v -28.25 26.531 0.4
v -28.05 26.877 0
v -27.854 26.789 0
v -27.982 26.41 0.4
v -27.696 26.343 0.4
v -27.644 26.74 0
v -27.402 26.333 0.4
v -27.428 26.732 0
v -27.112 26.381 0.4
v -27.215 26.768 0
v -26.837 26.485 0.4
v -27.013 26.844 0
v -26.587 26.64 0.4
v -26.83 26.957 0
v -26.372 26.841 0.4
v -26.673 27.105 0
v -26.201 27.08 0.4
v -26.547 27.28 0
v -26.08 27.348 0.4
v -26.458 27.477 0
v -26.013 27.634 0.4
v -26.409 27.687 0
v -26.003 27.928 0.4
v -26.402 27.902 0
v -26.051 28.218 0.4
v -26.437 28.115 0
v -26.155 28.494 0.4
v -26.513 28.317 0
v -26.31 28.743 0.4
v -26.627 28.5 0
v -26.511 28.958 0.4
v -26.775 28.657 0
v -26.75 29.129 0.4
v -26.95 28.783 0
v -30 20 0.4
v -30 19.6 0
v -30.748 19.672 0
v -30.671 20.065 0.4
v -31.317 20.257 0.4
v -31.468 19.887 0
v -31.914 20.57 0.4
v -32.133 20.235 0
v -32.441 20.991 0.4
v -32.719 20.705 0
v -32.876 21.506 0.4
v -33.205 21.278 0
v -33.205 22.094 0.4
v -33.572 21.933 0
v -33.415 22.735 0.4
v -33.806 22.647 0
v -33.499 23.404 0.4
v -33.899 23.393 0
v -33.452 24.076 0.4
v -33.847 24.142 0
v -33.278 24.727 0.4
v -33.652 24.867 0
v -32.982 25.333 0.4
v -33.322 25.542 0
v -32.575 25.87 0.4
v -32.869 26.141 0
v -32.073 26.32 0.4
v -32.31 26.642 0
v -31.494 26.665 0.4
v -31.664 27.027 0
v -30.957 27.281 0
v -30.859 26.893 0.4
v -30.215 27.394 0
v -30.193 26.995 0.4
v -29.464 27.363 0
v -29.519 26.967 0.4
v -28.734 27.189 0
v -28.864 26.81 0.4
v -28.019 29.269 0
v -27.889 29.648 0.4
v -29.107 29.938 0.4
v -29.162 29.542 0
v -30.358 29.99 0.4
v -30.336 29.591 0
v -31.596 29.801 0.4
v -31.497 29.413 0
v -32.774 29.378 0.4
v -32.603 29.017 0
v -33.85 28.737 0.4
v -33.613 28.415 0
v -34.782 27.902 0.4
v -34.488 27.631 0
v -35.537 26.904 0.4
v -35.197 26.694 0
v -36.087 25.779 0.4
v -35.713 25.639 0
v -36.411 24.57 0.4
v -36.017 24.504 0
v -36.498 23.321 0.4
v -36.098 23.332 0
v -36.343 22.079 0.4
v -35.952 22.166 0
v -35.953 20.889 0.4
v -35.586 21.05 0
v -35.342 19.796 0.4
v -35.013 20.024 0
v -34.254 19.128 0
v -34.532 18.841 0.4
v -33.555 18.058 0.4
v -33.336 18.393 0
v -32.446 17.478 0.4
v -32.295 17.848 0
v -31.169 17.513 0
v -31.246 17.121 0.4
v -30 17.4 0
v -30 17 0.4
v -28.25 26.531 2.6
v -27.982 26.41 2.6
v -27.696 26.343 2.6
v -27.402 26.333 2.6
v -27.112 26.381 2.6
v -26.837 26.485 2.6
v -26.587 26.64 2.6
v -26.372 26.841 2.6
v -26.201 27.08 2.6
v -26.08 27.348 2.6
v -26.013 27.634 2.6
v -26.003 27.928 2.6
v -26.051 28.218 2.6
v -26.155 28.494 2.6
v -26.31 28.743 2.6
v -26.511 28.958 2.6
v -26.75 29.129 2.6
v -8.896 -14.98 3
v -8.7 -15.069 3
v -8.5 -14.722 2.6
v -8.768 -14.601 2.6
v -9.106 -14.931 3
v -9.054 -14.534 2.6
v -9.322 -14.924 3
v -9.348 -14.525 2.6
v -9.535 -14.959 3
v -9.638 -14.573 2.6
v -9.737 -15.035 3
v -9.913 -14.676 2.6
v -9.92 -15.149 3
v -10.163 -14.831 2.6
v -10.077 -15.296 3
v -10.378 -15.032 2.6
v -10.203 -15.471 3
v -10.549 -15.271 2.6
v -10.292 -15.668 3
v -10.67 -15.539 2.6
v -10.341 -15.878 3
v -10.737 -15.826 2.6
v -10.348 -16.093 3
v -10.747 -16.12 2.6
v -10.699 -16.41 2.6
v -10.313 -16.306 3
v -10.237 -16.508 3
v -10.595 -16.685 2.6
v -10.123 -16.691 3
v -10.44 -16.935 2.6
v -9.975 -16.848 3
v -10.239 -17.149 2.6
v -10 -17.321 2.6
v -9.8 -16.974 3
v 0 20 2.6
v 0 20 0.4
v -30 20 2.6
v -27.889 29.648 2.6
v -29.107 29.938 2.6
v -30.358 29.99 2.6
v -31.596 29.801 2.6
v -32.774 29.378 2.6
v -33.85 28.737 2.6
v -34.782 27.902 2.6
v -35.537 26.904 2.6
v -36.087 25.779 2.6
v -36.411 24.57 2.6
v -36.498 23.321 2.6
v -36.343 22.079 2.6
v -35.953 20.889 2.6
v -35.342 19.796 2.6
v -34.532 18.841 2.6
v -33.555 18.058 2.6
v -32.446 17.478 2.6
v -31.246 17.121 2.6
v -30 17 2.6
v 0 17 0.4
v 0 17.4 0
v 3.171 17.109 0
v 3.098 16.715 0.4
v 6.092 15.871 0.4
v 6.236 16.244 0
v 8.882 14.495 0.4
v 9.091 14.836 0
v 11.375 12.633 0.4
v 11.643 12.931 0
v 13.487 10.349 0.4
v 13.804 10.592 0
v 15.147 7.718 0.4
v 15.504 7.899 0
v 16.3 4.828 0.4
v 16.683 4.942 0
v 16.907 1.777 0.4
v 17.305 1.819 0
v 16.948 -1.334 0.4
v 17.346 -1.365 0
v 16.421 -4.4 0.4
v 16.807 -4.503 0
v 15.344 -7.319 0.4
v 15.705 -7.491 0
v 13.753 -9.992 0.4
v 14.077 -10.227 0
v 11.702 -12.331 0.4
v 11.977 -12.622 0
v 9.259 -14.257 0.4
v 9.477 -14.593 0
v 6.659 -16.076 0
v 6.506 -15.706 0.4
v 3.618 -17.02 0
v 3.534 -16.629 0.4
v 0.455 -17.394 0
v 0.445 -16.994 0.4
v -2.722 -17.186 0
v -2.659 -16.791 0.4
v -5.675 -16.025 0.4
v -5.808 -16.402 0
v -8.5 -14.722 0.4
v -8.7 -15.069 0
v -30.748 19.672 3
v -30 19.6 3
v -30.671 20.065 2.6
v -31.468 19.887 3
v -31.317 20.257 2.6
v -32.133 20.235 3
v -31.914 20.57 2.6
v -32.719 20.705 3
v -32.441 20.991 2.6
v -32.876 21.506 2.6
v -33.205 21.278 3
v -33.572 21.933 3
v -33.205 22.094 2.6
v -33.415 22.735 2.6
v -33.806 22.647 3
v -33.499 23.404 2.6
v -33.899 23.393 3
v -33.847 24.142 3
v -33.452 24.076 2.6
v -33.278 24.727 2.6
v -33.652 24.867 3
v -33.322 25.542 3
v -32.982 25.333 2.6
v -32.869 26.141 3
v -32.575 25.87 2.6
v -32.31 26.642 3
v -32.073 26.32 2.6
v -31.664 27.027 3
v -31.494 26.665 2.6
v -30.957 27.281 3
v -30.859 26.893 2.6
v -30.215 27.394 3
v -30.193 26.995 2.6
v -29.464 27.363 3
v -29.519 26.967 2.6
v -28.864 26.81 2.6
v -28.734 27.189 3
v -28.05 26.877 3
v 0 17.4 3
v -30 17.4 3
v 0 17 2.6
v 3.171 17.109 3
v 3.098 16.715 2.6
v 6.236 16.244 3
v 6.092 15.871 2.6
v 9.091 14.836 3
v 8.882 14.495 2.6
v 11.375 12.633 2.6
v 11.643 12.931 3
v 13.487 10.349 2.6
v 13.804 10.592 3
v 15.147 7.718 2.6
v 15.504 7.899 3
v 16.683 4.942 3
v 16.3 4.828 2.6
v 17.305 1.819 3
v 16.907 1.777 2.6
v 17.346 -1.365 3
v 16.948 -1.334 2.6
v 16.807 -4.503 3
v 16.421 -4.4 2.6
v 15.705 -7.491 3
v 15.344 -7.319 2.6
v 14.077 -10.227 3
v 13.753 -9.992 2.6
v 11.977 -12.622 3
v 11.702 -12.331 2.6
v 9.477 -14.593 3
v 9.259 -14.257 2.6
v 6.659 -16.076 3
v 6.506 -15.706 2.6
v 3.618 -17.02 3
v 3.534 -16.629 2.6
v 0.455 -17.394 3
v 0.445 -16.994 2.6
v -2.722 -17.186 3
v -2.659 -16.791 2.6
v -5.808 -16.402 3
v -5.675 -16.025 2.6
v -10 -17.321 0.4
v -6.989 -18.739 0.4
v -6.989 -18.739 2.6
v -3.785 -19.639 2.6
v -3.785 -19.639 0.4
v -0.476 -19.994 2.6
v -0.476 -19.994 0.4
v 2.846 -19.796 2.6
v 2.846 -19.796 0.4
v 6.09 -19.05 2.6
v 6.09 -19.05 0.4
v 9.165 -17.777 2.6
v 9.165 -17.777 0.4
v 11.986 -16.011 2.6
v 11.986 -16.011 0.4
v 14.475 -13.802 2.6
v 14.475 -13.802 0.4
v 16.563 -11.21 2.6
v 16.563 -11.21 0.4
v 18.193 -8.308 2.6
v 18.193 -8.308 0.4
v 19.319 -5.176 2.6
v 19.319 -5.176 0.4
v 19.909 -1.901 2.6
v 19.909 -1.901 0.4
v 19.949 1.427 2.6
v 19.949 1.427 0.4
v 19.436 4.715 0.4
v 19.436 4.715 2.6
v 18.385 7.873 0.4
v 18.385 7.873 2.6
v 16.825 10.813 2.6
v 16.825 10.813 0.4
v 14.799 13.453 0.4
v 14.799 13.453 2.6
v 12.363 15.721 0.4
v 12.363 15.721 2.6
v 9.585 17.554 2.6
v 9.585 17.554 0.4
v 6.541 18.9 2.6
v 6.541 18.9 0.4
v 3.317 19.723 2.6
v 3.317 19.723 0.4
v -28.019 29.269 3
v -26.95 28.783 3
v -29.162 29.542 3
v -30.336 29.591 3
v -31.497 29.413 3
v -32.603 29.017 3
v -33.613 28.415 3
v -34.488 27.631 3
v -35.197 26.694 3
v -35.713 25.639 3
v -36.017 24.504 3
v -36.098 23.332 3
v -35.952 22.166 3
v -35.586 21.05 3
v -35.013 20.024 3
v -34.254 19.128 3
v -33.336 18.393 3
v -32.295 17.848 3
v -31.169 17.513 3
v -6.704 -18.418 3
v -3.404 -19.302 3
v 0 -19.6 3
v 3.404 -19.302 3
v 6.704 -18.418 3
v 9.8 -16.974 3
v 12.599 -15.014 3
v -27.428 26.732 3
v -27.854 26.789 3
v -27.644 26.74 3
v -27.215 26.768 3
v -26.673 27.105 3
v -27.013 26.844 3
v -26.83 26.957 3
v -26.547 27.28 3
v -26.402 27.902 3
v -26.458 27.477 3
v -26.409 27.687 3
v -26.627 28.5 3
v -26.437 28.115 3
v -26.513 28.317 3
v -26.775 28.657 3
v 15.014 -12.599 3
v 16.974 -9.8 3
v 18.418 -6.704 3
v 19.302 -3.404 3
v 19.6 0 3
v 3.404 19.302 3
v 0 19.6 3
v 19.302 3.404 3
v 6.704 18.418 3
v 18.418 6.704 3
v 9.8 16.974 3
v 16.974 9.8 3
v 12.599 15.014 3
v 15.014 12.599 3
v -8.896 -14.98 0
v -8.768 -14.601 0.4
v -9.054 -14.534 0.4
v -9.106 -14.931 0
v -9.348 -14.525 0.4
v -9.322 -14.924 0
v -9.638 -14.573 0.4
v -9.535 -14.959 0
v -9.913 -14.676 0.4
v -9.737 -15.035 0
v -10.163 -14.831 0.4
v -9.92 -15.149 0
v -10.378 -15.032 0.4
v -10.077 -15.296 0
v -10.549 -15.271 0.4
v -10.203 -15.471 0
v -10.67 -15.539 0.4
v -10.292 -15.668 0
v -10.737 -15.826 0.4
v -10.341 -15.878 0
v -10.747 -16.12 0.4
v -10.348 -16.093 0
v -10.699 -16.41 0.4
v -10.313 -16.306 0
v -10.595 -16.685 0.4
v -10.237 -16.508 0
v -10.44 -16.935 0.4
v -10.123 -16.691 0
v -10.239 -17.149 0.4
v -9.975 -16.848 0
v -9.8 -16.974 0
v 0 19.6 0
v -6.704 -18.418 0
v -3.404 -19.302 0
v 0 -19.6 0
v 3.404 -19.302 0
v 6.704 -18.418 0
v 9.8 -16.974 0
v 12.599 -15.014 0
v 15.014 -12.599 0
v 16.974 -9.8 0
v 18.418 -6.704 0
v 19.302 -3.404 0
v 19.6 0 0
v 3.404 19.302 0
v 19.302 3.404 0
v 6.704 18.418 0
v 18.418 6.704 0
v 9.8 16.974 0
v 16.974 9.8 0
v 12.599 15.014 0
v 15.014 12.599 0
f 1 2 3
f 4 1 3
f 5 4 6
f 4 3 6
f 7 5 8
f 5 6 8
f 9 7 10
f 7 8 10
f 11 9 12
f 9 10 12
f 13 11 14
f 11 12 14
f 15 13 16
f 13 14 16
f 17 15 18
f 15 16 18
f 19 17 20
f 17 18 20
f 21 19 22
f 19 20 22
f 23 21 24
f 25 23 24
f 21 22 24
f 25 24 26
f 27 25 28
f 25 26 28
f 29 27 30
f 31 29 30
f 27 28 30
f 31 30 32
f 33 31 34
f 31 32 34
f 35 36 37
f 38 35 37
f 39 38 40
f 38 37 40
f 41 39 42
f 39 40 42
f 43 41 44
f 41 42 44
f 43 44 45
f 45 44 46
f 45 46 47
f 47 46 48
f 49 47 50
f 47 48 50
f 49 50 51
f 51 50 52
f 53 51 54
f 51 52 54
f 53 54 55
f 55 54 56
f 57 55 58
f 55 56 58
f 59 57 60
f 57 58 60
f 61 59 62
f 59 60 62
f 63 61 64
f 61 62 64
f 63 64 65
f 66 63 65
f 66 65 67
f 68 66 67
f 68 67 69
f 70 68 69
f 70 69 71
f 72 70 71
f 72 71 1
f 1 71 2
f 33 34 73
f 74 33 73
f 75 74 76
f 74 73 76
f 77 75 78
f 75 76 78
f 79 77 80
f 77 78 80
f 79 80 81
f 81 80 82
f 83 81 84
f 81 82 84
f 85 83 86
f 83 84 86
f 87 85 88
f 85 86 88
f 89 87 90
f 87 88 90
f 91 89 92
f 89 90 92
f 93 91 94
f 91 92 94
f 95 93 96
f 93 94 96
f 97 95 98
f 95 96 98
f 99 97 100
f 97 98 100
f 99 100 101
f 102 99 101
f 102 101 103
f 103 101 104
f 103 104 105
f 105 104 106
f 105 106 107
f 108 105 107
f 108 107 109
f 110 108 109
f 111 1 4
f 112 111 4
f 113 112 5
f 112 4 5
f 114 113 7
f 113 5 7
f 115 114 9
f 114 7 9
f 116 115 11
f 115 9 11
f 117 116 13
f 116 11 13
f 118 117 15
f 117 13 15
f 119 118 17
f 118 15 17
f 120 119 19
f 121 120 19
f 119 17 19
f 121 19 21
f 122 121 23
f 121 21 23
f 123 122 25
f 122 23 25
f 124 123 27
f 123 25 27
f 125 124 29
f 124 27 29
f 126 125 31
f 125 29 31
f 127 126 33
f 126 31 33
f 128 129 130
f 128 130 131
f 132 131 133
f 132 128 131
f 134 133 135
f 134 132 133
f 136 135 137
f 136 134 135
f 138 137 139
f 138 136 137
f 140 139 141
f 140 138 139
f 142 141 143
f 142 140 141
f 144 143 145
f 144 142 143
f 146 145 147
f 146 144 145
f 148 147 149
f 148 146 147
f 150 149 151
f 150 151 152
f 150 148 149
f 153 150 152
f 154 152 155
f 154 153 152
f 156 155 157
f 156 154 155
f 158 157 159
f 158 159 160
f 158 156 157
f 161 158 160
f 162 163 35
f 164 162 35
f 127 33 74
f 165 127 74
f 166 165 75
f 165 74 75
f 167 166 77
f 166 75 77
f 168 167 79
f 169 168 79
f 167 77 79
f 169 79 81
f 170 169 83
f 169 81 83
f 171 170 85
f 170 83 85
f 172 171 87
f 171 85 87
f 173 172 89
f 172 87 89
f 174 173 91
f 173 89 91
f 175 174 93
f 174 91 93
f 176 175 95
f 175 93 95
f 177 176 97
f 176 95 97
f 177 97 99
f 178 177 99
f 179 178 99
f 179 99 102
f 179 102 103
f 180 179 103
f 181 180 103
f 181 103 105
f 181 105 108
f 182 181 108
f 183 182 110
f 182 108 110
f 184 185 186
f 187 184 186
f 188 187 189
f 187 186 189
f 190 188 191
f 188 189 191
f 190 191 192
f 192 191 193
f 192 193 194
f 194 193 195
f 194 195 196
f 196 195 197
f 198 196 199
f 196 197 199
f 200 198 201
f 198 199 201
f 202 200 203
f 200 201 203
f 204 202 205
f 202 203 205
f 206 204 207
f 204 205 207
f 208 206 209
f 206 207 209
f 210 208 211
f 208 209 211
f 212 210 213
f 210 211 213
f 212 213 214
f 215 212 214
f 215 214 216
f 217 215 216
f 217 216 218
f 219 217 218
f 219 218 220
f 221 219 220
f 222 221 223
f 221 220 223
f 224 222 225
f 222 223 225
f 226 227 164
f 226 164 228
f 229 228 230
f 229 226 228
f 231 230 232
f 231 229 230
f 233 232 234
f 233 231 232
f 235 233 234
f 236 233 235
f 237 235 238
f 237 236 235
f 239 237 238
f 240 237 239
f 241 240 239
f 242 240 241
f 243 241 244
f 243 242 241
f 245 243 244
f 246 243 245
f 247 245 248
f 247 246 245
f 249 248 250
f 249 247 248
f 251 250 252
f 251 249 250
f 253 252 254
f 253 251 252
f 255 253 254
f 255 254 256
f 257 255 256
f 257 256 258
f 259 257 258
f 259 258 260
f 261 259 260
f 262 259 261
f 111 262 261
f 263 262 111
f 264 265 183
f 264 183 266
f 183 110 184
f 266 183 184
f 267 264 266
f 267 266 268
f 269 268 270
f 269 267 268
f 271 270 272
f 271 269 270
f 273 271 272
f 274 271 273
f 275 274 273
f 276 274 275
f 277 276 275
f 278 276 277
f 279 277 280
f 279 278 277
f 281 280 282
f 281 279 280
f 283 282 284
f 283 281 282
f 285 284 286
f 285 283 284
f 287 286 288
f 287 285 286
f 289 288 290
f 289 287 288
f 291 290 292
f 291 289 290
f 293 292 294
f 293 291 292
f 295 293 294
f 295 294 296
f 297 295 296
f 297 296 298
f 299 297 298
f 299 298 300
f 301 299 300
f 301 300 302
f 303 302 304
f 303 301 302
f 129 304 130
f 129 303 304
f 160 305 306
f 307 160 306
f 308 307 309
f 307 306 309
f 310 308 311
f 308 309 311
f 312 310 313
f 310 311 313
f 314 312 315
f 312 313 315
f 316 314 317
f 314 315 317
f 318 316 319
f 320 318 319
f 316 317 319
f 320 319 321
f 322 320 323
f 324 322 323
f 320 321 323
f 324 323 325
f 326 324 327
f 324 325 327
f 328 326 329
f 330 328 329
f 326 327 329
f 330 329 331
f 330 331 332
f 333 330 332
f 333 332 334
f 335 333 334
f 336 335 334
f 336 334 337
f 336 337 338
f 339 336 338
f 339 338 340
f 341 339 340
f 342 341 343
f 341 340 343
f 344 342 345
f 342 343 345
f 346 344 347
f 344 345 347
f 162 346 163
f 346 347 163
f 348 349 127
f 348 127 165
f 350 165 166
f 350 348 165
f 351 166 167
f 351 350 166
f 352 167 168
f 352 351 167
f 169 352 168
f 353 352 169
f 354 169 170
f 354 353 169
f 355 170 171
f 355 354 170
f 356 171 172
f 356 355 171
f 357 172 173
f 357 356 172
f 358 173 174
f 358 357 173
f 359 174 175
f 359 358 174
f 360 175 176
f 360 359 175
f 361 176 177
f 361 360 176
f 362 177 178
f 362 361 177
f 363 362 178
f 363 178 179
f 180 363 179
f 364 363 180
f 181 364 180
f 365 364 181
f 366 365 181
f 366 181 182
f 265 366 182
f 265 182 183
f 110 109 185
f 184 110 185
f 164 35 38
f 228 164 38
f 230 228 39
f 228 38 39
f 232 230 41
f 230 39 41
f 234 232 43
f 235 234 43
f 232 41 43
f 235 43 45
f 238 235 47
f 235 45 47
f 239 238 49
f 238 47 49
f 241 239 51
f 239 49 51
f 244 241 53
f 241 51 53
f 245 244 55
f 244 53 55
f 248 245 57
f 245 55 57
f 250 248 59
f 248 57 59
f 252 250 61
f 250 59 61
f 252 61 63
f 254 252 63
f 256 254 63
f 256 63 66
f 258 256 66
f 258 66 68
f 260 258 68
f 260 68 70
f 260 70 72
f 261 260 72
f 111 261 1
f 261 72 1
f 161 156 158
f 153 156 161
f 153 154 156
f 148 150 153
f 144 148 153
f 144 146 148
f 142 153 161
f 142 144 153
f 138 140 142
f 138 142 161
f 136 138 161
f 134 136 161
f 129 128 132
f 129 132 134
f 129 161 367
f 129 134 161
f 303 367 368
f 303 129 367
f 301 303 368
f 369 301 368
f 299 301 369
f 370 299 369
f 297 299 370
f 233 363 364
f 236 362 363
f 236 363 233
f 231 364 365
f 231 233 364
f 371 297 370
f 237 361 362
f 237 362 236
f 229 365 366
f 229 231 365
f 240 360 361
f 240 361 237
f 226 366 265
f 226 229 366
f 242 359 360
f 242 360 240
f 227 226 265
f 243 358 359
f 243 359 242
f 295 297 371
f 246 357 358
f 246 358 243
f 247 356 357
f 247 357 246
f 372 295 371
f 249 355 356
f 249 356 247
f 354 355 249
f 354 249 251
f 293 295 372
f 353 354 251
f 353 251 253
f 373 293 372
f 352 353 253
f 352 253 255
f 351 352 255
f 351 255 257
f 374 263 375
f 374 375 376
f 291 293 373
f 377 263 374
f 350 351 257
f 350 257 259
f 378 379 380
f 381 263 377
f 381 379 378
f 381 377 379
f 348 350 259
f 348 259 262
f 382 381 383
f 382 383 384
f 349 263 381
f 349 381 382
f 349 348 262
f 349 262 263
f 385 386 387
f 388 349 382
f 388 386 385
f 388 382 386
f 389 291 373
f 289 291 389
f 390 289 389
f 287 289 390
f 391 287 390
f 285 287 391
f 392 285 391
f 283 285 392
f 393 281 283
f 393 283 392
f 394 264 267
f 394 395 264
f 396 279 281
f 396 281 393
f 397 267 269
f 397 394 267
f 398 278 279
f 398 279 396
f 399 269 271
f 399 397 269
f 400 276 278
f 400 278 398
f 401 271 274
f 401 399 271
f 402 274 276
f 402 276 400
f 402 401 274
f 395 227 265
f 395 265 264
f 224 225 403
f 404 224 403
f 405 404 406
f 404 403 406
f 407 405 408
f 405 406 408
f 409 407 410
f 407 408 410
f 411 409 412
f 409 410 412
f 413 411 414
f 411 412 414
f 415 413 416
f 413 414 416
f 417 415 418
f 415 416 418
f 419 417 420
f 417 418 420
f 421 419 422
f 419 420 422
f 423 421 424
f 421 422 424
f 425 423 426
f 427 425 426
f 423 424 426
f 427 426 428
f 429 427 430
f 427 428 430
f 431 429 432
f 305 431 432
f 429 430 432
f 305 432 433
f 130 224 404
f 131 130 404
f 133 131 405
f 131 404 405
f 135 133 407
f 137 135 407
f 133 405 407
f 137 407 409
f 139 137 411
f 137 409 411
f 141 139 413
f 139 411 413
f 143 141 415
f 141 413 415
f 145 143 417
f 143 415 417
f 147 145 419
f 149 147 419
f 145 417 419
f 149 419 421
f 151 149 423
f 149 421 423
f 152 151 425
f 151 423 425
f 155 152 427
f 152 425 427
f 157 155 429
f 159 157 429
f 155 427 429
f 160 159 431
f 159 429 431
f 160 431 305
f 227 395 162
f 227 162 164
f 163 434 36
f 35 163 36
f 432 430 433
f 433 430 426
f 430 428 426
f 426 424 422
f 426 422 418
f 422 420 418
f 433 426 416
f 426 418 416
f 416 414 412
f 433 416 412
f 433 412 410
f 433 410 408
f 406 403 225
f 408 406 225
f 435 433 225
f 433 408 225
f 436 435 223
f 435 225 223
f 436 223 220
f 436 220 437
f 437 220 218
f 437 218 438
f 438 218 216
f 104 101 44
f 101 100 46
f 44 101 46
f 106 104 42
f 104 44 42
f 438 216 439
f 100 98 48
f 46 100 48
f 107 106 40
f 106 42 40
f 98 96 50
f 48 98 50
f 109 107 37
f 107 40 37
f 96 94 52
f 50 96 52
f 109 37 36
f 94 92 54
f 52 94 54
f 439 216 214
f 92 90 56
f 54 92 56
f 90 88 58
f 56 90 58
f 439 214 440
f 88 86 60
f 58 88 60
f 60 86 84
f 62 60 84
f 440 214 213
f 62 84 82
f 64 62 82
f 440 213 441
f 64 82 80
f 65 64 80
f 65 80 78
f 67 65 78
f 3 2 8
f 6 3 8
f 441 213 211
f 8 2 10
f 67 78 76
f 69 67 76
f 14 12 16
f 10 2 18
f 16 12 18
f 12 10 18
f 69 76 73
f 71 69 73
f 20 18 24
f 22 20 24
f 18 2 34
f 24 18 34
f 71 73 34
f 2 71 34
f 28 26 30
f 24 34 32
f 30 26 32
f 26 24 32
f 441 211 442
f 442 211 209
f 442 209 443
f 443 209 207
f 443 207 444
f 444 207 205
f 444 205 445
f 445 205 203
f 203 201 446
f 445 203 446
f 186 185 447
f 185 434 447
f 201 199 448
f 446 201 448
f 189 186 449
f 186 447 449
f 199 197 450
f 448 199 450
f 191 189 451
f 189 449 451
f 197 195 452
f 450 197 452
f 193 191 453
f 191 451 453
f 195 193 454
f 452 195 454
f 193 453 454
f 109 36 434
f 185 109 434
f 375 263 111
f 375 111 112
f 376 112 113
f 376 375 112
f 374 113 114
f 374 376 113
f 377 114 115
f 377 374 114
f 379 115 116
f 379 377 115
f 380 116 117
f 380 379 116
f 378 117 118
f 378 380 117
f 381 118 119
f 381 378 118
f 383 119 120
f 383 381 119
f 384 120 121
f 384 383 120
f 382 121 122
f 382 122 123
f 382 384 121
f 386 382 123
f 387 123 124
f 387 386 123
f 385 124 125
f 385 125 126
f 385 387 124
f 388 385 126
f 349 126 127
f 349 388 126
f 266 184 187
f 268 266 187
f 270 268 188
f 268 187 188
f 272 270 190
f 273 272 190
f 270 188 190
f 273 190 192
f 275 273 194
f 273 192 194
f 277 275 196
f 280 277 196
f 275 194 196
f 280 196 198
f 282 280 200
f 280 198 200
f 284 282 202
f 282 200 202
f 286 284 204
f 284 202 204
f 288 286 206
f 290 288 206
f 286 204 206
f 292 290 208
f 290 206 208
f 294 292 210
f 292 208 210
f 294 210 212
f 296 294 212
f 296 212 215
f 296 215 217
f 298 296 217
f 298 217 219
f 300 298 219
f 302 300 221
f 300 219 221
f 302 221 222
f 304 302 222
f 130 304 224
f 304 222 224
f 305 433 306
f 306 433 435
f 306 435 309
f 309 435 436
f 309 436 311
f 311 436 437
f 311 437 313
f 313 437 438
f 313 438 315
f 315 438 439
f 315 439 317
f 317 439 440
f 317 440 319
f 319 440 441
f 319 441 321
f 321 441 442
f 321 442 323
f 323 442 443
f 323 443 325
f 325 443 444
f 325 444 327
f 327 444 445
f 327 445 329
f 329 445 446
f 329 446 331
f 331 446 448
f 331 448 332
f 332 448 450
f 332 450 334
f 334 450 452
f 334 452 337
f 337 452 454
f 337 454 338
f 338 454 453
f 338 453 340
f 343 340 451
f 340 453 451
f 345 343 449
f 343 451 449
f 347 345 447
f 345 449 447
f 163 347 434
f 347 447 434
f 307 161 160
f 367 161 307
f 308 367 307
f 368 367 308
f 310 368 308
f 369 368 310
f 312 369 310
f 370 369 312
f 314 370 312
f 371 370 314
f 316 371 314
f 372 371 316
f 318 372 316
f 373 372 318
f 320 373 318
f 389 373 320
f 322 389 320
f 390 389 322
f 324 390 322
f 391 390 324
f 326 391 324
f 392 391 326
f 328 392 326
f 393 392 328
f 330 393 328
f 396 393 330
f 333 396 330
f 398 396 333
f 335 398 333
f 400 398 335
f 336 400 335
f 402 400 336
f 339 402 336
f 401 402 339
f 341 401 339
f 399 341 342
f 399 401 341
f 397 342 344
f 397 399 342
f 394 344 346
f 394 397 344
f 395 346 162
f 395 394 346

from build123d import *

# Parameters (mm, degrees)
F2_DEPTH = 3
F3_SIZE  = 0.4


with BuildPart() as f2:
    # F1 (on Top) → F2 (new body)
    with BuildSketch(Plane.XY):
        with BuildLine():
            ThreePointArc((0, 17), (16.4207390469, -4.3999237667), (-8.5, -14.7224318643))
            ThreePointArc((-8.5, -14.7224318643), (-10.5490381057, -15.27146997), (-10, -17.3205080757))
            ThreePointArc((-10, -17.3205080757), (19.3185165258, -5.1763809021), (0, 20))
            Line((0, 20), (-30, 20))
            ThreePointArc((-30, 20), (-33.380740392, 24.4058666579), (-28.25, 26.5310889132))
            ThreePointArc((-28.25, 26.5310889132), (-26.2009618943, 27.0801270189), (-26.75, 29.1291651246))
            ThreePointArc((-26.75, 29.1291651246), (-36.2785178709, 25.1823237932), (-30, 17))
            Line((-30, 17), (0, 17))
        make_face()
    extrude(amount=F2_DEPTH)

    # F3
    f3_edges = [f2.edges().sort_by_distance(p)[0] for p in [
        (-15, 17, 3),
        (-15, 17, 0),
    ]]
    chamfer(f3_edges, length=F3_SIZE)


solid = f2.part
